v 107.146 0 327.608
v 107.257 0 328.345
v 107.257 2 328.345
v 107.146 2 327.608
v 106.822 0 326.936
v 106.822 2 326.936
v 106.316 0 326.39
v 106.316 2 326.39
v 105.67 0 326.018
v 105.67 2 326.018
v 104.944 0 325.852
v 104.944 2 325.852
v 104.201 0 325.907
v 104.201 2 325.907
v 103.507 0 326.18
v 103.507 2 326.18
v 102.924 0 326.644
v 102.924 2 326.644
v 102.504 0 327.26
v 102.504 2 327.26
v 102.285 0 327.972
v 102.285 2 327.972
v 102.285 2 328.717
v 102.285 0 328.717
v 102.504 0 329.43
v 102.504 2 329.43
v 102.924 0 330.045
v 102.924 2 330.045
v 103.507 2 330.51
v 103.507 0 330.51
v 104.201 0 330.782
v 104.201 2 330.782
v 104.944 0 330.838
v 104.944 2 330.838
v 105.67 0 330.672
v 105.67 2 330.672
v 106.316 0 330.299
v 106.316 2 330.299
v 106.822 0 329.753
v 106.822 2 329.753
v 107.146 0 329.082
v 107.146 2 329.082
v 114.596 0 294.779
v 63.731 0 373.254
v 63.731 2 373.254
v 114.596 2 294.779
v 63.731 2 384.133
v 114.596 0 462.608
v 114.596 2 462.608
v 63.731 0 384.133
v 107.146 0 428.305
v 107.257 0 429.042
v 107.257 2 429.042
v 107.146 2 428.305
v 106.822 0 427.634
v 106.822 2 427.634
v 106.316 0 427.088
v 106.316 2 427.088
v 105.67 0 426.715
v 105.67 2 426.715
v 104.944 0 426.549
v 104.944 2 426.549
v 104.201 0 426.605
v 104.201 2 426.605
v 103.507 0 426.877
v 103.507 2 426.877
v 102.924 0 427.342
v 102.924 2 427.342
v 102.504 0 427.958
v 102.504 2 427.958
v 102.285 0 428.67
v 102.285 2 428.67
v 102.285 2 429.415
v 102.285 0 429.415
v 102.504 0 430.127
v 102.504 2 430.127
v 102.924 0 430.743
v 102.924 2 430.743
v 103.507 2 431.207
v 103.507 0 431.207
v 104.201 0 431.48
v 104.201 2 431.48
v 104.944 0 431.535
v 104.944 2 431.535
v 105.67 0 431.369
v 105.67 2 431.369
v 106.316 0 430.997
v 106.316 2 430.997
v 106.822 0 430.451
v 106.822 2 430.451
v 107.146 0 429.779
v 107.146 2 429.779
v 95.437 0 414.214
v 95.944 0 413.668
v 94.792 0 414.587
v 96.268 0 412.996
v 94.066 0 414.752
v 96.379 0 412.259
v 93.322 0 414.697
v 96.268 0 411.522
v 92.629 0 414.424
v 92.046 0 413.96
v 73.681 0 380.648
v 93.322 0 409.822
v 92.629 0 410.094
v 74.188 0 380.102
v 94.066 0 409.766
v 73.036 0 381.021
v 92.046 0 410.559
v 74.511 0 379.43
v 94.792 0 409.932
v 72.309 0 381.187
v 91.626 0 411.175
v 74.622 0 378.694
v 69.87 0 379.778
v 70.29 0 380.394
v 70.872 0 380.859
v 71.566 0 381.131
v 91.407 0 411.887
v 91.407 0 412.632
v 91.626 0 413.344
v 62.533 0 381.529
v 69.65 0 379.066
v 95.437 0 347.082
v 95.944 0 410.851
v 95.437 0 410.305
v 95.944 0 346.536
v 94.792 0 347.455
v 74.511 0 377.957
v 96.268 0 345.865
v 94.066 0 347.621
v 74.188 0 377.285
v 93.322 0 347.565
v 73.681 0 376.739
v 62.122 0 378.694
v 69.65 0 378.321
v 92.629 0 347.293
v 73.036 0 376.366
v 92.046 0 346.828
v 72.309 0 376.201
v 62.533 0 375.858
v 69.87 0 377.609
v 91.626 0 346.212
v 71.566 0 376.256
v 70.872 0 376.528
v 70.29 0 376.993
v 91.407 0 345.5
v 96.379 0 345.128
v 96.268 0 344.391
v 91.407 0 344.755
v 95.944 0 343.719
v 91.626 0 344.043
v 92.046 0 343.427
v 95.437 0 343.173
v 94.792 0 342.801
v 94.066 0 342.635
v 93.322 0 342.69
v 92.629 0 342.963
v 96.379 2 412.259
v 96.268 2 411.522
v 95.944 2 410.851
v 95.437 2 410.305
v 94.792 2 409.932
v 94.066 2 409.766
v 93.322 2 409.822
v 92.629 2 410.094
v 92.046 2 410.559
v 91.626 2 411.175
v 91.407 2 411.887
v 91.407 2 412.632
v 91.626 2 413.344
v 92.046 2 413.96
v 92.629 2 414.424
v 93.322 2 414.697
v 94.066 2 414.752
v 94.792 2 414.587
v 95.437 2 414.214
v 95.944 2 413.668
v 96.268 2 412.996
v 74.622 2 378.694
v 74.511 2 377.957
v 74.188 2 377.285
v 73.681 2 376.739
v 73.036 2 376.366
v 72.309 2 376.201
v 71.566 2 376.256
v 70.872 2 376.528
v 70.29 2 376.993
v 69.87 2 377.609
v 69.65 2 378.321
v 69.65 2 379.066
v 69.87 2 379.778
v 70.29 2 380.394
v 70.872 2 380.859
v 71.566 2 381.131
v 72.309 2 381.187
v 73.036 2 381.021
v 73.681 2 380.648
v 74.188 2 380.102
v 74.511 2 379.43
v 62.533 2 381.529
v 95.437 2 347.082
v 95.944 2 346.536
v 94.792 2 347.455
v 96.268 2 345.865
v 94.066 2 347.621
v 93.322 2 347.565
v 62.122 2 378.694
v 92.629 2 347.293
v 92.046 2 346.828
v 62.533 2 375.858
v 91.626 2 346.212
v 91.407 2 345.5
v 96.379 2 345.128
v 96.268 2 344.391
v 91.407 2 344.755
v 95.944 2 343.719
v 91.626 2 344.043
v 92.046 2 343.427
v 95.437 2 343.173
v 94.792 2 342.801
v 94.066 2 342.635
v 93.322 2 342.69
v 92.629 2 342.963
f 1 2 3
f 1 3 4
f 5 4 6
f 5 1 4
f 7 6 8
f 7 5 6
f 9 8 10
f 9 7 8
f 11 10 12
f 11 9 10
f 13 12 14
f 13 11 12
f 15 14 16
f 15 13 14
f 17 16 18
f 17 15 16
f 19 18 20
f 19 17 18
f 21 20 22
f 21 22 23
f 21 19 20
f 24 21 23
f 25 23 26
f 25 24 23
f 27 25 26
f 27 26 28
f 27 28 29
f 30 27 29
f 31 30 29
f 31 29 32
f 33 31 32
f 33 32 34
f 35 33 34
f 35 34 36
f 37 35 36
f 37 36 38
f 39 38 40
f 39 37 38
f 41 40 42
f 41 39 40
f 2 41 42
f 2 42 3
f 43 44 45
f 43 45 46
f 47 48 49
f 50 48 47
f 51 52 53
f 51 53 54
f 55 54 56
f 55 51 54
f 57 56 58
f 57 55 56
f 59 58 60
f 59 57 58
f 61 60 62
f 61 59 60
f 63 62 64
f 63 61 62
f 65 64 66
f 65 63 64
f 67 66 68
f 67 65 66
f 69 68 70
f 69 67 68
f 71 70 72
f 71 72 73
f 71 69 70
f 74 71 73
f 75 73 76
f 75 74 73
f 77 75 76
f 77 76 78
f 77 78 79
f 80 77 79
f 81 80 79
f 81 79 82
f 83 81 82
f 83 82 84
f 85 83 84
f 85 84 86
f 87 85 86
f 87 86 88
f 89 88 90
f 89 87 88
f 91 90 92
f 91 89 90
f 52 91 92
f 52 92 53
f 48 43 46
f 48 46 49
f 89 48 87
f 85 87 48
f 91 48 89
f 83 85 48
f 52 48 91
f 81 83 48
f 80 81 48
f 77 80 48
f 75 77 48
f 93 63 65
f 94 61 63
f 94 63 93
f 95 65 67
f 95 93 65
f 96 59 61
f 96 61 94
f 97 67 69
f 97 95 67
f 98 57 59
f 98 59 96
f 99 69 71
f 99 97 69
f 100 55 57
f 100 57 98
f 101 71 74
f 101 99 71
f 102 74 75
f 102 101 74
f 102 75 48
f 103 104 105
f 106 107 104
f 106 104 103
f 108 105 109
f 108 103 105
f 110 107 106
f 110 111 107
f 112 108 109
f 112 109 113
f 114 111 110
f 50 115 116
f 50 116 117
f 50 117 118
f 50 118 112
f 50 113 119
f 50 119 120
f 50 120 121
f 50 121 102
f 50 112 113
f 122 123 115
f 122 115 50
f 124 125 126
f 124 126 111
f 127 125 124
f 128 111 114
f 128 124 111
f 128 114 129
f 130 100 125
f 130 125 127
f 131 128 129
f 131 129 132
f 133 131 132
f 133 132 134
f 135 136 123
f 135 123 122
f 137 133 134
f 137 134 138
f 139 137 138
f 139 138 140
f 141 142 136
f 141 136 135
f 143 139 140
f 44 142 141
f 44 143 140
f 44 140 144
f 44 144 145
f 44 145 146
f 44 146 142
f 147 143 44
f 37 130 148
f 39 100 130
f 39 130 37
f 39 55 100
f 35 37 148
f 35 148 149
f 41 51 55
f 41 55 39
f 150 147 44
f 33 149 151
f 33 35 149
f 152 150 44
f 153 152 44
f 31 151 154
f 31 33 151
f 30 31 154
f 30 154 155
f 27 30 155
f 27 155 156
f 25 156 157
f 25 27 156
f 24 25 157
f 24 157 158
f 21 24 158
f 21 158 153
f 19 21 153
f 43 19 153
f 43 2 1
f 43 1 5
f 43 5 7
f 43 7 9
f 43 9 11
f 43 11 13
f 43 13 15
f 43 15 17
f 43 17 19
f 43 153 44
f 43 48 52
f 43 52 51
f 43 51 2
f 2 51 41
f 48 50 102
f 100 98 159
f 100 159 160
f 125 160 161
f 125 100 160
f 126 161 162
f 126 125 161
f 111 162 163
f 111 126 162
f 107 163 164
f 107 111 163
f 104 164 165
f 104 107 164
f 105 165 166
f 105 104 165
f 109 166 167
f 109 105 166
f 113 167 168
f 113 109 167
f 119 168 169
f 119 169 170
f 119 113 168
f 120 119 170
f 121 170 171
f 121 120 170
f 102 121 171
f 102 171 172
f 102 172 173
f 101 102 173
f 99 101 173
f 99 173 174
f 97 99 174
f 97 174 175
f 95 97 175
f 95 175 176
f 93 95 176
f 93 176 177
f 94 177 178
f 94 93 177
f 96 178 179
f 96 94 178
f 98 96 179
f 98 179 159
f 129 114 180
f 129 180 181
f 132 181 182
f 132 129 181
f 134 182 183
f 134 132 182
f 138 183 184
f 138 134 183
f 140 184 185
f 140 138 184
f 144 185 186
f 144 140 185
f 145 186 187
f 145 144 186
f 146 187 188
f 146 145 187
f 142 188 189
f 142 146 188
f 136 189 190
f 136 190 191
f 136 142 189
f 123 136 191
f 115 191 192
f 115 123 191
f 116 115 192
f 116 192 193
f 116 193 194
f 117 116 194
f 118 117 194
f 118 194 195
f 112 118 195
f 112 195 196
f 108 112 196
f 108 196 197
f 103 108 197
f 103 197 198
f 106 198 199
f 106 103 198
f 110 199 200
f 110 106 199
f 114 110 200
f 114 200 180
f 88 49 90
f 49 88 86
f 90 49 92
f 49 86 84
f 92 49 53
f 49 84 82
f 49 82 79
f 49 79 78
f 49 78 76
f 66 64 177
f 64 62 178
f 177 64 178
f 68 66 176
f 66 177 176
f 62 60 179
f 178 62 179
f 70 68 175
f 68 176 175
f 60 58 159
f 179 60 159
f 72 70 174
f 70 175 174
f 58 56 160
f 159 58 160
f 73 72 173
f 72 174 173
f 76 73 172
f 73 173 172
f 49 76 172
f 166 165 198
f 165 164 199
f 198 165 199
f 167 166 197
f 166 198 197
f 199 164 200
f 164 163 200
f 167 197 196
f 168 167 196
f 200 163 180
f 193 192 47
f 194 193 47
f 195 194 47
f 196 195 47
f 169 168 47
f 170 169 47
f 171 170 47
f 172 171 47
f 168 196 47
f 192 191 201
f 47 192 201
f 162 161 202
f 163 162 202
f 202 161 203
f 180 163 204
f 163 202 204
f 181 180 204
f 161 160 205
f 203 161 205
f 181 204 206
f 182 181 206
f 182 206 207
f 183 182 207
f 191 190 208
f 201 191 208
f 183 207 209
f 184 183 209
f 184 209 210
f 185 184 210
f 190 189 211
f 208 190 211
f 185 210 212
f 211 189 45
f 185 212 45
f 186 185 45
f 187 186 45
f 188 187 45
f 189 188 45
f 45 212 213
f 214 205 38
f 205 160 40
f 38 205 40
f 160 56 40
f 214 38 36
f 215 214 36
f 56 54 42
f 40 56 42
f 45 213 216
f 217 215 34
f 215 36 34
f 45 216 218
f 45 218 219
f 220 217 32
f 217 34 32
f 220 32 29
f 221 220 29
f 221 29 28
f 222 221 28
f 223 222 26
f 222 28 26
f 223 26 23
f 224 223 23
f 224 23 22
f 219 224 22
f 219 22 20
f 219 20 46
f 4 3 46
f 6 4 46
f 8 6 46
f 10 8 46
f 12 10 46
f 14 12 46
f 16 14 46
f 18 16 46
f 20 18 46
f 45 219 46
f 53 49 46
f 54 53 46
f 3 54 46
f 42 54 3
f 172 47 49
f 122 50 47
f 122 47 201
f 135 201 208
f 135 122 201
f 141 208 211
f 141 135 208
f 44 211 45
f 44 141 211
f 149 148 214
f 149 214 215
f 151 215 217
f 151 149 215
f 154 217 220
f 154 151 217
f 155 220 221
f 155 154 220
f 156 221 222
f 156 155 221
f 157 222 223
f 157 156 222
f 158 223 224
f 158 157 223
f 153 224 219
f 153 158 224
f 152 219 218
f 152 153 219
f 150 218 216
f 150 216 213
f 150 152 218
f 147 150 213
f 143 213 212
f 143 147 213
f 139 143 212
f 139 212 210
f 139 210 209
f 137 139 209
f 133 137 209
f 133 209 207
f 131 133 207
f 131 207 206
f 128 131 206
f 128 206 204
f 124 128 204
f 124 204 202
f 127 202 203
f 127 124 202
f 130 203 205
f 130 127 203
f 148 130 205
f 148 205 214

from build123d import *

# Parameters (mm, degrees)
SKETCH1_R           = 2.5
BOSS_EXTRUDE1_DEPTH = 2


with BuildPart() as part:
    # Sketch1 → Boss-Extrude1 (new body)
    with BuildSketch(Plane(origin=(0, 0, 0), x_dir=(1, 0, 0), z_dir=(0, 1, 0))):
        with BuildLine():
            Line((63.73099869, -373.254460076), (114.596265016, -294.778975996))
            Line((114.596265016, -294.778975996), (114.596265016, -462.608083148))
            Line((114.596265016, -462.608083148), (63.73099869, -384.132599068))
            ThreePointArc((63.73099869, -384.132599068), (62.122454047, -378.693529572), (63.73099869, -373.254460076))
        make_face()
        with Locations((72.122454047, -378.693529572)):
            Circle(SKETCH1_R, mode=Mode.SUBTRACT)
        with Locations((93.878732031, -345.127708141)):
            Circle(SKETCH1_R, mode=Mode.SUBTRACT)
        with Locations((104.756871022, -328.344797426)):
            Circle(SKETCH1_R, mode=Mode.SUBTRACT)
        with Locations((93.878732031, -412.259351002)):
            Circle(SKETCH1_R, mode=Mode.SUBTRACT)
        with Locations((104.756871022, -429.042261718)):
            Circle(SKETCH1_R, mode=Mode.SUBTRACT)
    extrude(amount=BOSS_EXTRUDE1_DEPTH)


solid = part.part
